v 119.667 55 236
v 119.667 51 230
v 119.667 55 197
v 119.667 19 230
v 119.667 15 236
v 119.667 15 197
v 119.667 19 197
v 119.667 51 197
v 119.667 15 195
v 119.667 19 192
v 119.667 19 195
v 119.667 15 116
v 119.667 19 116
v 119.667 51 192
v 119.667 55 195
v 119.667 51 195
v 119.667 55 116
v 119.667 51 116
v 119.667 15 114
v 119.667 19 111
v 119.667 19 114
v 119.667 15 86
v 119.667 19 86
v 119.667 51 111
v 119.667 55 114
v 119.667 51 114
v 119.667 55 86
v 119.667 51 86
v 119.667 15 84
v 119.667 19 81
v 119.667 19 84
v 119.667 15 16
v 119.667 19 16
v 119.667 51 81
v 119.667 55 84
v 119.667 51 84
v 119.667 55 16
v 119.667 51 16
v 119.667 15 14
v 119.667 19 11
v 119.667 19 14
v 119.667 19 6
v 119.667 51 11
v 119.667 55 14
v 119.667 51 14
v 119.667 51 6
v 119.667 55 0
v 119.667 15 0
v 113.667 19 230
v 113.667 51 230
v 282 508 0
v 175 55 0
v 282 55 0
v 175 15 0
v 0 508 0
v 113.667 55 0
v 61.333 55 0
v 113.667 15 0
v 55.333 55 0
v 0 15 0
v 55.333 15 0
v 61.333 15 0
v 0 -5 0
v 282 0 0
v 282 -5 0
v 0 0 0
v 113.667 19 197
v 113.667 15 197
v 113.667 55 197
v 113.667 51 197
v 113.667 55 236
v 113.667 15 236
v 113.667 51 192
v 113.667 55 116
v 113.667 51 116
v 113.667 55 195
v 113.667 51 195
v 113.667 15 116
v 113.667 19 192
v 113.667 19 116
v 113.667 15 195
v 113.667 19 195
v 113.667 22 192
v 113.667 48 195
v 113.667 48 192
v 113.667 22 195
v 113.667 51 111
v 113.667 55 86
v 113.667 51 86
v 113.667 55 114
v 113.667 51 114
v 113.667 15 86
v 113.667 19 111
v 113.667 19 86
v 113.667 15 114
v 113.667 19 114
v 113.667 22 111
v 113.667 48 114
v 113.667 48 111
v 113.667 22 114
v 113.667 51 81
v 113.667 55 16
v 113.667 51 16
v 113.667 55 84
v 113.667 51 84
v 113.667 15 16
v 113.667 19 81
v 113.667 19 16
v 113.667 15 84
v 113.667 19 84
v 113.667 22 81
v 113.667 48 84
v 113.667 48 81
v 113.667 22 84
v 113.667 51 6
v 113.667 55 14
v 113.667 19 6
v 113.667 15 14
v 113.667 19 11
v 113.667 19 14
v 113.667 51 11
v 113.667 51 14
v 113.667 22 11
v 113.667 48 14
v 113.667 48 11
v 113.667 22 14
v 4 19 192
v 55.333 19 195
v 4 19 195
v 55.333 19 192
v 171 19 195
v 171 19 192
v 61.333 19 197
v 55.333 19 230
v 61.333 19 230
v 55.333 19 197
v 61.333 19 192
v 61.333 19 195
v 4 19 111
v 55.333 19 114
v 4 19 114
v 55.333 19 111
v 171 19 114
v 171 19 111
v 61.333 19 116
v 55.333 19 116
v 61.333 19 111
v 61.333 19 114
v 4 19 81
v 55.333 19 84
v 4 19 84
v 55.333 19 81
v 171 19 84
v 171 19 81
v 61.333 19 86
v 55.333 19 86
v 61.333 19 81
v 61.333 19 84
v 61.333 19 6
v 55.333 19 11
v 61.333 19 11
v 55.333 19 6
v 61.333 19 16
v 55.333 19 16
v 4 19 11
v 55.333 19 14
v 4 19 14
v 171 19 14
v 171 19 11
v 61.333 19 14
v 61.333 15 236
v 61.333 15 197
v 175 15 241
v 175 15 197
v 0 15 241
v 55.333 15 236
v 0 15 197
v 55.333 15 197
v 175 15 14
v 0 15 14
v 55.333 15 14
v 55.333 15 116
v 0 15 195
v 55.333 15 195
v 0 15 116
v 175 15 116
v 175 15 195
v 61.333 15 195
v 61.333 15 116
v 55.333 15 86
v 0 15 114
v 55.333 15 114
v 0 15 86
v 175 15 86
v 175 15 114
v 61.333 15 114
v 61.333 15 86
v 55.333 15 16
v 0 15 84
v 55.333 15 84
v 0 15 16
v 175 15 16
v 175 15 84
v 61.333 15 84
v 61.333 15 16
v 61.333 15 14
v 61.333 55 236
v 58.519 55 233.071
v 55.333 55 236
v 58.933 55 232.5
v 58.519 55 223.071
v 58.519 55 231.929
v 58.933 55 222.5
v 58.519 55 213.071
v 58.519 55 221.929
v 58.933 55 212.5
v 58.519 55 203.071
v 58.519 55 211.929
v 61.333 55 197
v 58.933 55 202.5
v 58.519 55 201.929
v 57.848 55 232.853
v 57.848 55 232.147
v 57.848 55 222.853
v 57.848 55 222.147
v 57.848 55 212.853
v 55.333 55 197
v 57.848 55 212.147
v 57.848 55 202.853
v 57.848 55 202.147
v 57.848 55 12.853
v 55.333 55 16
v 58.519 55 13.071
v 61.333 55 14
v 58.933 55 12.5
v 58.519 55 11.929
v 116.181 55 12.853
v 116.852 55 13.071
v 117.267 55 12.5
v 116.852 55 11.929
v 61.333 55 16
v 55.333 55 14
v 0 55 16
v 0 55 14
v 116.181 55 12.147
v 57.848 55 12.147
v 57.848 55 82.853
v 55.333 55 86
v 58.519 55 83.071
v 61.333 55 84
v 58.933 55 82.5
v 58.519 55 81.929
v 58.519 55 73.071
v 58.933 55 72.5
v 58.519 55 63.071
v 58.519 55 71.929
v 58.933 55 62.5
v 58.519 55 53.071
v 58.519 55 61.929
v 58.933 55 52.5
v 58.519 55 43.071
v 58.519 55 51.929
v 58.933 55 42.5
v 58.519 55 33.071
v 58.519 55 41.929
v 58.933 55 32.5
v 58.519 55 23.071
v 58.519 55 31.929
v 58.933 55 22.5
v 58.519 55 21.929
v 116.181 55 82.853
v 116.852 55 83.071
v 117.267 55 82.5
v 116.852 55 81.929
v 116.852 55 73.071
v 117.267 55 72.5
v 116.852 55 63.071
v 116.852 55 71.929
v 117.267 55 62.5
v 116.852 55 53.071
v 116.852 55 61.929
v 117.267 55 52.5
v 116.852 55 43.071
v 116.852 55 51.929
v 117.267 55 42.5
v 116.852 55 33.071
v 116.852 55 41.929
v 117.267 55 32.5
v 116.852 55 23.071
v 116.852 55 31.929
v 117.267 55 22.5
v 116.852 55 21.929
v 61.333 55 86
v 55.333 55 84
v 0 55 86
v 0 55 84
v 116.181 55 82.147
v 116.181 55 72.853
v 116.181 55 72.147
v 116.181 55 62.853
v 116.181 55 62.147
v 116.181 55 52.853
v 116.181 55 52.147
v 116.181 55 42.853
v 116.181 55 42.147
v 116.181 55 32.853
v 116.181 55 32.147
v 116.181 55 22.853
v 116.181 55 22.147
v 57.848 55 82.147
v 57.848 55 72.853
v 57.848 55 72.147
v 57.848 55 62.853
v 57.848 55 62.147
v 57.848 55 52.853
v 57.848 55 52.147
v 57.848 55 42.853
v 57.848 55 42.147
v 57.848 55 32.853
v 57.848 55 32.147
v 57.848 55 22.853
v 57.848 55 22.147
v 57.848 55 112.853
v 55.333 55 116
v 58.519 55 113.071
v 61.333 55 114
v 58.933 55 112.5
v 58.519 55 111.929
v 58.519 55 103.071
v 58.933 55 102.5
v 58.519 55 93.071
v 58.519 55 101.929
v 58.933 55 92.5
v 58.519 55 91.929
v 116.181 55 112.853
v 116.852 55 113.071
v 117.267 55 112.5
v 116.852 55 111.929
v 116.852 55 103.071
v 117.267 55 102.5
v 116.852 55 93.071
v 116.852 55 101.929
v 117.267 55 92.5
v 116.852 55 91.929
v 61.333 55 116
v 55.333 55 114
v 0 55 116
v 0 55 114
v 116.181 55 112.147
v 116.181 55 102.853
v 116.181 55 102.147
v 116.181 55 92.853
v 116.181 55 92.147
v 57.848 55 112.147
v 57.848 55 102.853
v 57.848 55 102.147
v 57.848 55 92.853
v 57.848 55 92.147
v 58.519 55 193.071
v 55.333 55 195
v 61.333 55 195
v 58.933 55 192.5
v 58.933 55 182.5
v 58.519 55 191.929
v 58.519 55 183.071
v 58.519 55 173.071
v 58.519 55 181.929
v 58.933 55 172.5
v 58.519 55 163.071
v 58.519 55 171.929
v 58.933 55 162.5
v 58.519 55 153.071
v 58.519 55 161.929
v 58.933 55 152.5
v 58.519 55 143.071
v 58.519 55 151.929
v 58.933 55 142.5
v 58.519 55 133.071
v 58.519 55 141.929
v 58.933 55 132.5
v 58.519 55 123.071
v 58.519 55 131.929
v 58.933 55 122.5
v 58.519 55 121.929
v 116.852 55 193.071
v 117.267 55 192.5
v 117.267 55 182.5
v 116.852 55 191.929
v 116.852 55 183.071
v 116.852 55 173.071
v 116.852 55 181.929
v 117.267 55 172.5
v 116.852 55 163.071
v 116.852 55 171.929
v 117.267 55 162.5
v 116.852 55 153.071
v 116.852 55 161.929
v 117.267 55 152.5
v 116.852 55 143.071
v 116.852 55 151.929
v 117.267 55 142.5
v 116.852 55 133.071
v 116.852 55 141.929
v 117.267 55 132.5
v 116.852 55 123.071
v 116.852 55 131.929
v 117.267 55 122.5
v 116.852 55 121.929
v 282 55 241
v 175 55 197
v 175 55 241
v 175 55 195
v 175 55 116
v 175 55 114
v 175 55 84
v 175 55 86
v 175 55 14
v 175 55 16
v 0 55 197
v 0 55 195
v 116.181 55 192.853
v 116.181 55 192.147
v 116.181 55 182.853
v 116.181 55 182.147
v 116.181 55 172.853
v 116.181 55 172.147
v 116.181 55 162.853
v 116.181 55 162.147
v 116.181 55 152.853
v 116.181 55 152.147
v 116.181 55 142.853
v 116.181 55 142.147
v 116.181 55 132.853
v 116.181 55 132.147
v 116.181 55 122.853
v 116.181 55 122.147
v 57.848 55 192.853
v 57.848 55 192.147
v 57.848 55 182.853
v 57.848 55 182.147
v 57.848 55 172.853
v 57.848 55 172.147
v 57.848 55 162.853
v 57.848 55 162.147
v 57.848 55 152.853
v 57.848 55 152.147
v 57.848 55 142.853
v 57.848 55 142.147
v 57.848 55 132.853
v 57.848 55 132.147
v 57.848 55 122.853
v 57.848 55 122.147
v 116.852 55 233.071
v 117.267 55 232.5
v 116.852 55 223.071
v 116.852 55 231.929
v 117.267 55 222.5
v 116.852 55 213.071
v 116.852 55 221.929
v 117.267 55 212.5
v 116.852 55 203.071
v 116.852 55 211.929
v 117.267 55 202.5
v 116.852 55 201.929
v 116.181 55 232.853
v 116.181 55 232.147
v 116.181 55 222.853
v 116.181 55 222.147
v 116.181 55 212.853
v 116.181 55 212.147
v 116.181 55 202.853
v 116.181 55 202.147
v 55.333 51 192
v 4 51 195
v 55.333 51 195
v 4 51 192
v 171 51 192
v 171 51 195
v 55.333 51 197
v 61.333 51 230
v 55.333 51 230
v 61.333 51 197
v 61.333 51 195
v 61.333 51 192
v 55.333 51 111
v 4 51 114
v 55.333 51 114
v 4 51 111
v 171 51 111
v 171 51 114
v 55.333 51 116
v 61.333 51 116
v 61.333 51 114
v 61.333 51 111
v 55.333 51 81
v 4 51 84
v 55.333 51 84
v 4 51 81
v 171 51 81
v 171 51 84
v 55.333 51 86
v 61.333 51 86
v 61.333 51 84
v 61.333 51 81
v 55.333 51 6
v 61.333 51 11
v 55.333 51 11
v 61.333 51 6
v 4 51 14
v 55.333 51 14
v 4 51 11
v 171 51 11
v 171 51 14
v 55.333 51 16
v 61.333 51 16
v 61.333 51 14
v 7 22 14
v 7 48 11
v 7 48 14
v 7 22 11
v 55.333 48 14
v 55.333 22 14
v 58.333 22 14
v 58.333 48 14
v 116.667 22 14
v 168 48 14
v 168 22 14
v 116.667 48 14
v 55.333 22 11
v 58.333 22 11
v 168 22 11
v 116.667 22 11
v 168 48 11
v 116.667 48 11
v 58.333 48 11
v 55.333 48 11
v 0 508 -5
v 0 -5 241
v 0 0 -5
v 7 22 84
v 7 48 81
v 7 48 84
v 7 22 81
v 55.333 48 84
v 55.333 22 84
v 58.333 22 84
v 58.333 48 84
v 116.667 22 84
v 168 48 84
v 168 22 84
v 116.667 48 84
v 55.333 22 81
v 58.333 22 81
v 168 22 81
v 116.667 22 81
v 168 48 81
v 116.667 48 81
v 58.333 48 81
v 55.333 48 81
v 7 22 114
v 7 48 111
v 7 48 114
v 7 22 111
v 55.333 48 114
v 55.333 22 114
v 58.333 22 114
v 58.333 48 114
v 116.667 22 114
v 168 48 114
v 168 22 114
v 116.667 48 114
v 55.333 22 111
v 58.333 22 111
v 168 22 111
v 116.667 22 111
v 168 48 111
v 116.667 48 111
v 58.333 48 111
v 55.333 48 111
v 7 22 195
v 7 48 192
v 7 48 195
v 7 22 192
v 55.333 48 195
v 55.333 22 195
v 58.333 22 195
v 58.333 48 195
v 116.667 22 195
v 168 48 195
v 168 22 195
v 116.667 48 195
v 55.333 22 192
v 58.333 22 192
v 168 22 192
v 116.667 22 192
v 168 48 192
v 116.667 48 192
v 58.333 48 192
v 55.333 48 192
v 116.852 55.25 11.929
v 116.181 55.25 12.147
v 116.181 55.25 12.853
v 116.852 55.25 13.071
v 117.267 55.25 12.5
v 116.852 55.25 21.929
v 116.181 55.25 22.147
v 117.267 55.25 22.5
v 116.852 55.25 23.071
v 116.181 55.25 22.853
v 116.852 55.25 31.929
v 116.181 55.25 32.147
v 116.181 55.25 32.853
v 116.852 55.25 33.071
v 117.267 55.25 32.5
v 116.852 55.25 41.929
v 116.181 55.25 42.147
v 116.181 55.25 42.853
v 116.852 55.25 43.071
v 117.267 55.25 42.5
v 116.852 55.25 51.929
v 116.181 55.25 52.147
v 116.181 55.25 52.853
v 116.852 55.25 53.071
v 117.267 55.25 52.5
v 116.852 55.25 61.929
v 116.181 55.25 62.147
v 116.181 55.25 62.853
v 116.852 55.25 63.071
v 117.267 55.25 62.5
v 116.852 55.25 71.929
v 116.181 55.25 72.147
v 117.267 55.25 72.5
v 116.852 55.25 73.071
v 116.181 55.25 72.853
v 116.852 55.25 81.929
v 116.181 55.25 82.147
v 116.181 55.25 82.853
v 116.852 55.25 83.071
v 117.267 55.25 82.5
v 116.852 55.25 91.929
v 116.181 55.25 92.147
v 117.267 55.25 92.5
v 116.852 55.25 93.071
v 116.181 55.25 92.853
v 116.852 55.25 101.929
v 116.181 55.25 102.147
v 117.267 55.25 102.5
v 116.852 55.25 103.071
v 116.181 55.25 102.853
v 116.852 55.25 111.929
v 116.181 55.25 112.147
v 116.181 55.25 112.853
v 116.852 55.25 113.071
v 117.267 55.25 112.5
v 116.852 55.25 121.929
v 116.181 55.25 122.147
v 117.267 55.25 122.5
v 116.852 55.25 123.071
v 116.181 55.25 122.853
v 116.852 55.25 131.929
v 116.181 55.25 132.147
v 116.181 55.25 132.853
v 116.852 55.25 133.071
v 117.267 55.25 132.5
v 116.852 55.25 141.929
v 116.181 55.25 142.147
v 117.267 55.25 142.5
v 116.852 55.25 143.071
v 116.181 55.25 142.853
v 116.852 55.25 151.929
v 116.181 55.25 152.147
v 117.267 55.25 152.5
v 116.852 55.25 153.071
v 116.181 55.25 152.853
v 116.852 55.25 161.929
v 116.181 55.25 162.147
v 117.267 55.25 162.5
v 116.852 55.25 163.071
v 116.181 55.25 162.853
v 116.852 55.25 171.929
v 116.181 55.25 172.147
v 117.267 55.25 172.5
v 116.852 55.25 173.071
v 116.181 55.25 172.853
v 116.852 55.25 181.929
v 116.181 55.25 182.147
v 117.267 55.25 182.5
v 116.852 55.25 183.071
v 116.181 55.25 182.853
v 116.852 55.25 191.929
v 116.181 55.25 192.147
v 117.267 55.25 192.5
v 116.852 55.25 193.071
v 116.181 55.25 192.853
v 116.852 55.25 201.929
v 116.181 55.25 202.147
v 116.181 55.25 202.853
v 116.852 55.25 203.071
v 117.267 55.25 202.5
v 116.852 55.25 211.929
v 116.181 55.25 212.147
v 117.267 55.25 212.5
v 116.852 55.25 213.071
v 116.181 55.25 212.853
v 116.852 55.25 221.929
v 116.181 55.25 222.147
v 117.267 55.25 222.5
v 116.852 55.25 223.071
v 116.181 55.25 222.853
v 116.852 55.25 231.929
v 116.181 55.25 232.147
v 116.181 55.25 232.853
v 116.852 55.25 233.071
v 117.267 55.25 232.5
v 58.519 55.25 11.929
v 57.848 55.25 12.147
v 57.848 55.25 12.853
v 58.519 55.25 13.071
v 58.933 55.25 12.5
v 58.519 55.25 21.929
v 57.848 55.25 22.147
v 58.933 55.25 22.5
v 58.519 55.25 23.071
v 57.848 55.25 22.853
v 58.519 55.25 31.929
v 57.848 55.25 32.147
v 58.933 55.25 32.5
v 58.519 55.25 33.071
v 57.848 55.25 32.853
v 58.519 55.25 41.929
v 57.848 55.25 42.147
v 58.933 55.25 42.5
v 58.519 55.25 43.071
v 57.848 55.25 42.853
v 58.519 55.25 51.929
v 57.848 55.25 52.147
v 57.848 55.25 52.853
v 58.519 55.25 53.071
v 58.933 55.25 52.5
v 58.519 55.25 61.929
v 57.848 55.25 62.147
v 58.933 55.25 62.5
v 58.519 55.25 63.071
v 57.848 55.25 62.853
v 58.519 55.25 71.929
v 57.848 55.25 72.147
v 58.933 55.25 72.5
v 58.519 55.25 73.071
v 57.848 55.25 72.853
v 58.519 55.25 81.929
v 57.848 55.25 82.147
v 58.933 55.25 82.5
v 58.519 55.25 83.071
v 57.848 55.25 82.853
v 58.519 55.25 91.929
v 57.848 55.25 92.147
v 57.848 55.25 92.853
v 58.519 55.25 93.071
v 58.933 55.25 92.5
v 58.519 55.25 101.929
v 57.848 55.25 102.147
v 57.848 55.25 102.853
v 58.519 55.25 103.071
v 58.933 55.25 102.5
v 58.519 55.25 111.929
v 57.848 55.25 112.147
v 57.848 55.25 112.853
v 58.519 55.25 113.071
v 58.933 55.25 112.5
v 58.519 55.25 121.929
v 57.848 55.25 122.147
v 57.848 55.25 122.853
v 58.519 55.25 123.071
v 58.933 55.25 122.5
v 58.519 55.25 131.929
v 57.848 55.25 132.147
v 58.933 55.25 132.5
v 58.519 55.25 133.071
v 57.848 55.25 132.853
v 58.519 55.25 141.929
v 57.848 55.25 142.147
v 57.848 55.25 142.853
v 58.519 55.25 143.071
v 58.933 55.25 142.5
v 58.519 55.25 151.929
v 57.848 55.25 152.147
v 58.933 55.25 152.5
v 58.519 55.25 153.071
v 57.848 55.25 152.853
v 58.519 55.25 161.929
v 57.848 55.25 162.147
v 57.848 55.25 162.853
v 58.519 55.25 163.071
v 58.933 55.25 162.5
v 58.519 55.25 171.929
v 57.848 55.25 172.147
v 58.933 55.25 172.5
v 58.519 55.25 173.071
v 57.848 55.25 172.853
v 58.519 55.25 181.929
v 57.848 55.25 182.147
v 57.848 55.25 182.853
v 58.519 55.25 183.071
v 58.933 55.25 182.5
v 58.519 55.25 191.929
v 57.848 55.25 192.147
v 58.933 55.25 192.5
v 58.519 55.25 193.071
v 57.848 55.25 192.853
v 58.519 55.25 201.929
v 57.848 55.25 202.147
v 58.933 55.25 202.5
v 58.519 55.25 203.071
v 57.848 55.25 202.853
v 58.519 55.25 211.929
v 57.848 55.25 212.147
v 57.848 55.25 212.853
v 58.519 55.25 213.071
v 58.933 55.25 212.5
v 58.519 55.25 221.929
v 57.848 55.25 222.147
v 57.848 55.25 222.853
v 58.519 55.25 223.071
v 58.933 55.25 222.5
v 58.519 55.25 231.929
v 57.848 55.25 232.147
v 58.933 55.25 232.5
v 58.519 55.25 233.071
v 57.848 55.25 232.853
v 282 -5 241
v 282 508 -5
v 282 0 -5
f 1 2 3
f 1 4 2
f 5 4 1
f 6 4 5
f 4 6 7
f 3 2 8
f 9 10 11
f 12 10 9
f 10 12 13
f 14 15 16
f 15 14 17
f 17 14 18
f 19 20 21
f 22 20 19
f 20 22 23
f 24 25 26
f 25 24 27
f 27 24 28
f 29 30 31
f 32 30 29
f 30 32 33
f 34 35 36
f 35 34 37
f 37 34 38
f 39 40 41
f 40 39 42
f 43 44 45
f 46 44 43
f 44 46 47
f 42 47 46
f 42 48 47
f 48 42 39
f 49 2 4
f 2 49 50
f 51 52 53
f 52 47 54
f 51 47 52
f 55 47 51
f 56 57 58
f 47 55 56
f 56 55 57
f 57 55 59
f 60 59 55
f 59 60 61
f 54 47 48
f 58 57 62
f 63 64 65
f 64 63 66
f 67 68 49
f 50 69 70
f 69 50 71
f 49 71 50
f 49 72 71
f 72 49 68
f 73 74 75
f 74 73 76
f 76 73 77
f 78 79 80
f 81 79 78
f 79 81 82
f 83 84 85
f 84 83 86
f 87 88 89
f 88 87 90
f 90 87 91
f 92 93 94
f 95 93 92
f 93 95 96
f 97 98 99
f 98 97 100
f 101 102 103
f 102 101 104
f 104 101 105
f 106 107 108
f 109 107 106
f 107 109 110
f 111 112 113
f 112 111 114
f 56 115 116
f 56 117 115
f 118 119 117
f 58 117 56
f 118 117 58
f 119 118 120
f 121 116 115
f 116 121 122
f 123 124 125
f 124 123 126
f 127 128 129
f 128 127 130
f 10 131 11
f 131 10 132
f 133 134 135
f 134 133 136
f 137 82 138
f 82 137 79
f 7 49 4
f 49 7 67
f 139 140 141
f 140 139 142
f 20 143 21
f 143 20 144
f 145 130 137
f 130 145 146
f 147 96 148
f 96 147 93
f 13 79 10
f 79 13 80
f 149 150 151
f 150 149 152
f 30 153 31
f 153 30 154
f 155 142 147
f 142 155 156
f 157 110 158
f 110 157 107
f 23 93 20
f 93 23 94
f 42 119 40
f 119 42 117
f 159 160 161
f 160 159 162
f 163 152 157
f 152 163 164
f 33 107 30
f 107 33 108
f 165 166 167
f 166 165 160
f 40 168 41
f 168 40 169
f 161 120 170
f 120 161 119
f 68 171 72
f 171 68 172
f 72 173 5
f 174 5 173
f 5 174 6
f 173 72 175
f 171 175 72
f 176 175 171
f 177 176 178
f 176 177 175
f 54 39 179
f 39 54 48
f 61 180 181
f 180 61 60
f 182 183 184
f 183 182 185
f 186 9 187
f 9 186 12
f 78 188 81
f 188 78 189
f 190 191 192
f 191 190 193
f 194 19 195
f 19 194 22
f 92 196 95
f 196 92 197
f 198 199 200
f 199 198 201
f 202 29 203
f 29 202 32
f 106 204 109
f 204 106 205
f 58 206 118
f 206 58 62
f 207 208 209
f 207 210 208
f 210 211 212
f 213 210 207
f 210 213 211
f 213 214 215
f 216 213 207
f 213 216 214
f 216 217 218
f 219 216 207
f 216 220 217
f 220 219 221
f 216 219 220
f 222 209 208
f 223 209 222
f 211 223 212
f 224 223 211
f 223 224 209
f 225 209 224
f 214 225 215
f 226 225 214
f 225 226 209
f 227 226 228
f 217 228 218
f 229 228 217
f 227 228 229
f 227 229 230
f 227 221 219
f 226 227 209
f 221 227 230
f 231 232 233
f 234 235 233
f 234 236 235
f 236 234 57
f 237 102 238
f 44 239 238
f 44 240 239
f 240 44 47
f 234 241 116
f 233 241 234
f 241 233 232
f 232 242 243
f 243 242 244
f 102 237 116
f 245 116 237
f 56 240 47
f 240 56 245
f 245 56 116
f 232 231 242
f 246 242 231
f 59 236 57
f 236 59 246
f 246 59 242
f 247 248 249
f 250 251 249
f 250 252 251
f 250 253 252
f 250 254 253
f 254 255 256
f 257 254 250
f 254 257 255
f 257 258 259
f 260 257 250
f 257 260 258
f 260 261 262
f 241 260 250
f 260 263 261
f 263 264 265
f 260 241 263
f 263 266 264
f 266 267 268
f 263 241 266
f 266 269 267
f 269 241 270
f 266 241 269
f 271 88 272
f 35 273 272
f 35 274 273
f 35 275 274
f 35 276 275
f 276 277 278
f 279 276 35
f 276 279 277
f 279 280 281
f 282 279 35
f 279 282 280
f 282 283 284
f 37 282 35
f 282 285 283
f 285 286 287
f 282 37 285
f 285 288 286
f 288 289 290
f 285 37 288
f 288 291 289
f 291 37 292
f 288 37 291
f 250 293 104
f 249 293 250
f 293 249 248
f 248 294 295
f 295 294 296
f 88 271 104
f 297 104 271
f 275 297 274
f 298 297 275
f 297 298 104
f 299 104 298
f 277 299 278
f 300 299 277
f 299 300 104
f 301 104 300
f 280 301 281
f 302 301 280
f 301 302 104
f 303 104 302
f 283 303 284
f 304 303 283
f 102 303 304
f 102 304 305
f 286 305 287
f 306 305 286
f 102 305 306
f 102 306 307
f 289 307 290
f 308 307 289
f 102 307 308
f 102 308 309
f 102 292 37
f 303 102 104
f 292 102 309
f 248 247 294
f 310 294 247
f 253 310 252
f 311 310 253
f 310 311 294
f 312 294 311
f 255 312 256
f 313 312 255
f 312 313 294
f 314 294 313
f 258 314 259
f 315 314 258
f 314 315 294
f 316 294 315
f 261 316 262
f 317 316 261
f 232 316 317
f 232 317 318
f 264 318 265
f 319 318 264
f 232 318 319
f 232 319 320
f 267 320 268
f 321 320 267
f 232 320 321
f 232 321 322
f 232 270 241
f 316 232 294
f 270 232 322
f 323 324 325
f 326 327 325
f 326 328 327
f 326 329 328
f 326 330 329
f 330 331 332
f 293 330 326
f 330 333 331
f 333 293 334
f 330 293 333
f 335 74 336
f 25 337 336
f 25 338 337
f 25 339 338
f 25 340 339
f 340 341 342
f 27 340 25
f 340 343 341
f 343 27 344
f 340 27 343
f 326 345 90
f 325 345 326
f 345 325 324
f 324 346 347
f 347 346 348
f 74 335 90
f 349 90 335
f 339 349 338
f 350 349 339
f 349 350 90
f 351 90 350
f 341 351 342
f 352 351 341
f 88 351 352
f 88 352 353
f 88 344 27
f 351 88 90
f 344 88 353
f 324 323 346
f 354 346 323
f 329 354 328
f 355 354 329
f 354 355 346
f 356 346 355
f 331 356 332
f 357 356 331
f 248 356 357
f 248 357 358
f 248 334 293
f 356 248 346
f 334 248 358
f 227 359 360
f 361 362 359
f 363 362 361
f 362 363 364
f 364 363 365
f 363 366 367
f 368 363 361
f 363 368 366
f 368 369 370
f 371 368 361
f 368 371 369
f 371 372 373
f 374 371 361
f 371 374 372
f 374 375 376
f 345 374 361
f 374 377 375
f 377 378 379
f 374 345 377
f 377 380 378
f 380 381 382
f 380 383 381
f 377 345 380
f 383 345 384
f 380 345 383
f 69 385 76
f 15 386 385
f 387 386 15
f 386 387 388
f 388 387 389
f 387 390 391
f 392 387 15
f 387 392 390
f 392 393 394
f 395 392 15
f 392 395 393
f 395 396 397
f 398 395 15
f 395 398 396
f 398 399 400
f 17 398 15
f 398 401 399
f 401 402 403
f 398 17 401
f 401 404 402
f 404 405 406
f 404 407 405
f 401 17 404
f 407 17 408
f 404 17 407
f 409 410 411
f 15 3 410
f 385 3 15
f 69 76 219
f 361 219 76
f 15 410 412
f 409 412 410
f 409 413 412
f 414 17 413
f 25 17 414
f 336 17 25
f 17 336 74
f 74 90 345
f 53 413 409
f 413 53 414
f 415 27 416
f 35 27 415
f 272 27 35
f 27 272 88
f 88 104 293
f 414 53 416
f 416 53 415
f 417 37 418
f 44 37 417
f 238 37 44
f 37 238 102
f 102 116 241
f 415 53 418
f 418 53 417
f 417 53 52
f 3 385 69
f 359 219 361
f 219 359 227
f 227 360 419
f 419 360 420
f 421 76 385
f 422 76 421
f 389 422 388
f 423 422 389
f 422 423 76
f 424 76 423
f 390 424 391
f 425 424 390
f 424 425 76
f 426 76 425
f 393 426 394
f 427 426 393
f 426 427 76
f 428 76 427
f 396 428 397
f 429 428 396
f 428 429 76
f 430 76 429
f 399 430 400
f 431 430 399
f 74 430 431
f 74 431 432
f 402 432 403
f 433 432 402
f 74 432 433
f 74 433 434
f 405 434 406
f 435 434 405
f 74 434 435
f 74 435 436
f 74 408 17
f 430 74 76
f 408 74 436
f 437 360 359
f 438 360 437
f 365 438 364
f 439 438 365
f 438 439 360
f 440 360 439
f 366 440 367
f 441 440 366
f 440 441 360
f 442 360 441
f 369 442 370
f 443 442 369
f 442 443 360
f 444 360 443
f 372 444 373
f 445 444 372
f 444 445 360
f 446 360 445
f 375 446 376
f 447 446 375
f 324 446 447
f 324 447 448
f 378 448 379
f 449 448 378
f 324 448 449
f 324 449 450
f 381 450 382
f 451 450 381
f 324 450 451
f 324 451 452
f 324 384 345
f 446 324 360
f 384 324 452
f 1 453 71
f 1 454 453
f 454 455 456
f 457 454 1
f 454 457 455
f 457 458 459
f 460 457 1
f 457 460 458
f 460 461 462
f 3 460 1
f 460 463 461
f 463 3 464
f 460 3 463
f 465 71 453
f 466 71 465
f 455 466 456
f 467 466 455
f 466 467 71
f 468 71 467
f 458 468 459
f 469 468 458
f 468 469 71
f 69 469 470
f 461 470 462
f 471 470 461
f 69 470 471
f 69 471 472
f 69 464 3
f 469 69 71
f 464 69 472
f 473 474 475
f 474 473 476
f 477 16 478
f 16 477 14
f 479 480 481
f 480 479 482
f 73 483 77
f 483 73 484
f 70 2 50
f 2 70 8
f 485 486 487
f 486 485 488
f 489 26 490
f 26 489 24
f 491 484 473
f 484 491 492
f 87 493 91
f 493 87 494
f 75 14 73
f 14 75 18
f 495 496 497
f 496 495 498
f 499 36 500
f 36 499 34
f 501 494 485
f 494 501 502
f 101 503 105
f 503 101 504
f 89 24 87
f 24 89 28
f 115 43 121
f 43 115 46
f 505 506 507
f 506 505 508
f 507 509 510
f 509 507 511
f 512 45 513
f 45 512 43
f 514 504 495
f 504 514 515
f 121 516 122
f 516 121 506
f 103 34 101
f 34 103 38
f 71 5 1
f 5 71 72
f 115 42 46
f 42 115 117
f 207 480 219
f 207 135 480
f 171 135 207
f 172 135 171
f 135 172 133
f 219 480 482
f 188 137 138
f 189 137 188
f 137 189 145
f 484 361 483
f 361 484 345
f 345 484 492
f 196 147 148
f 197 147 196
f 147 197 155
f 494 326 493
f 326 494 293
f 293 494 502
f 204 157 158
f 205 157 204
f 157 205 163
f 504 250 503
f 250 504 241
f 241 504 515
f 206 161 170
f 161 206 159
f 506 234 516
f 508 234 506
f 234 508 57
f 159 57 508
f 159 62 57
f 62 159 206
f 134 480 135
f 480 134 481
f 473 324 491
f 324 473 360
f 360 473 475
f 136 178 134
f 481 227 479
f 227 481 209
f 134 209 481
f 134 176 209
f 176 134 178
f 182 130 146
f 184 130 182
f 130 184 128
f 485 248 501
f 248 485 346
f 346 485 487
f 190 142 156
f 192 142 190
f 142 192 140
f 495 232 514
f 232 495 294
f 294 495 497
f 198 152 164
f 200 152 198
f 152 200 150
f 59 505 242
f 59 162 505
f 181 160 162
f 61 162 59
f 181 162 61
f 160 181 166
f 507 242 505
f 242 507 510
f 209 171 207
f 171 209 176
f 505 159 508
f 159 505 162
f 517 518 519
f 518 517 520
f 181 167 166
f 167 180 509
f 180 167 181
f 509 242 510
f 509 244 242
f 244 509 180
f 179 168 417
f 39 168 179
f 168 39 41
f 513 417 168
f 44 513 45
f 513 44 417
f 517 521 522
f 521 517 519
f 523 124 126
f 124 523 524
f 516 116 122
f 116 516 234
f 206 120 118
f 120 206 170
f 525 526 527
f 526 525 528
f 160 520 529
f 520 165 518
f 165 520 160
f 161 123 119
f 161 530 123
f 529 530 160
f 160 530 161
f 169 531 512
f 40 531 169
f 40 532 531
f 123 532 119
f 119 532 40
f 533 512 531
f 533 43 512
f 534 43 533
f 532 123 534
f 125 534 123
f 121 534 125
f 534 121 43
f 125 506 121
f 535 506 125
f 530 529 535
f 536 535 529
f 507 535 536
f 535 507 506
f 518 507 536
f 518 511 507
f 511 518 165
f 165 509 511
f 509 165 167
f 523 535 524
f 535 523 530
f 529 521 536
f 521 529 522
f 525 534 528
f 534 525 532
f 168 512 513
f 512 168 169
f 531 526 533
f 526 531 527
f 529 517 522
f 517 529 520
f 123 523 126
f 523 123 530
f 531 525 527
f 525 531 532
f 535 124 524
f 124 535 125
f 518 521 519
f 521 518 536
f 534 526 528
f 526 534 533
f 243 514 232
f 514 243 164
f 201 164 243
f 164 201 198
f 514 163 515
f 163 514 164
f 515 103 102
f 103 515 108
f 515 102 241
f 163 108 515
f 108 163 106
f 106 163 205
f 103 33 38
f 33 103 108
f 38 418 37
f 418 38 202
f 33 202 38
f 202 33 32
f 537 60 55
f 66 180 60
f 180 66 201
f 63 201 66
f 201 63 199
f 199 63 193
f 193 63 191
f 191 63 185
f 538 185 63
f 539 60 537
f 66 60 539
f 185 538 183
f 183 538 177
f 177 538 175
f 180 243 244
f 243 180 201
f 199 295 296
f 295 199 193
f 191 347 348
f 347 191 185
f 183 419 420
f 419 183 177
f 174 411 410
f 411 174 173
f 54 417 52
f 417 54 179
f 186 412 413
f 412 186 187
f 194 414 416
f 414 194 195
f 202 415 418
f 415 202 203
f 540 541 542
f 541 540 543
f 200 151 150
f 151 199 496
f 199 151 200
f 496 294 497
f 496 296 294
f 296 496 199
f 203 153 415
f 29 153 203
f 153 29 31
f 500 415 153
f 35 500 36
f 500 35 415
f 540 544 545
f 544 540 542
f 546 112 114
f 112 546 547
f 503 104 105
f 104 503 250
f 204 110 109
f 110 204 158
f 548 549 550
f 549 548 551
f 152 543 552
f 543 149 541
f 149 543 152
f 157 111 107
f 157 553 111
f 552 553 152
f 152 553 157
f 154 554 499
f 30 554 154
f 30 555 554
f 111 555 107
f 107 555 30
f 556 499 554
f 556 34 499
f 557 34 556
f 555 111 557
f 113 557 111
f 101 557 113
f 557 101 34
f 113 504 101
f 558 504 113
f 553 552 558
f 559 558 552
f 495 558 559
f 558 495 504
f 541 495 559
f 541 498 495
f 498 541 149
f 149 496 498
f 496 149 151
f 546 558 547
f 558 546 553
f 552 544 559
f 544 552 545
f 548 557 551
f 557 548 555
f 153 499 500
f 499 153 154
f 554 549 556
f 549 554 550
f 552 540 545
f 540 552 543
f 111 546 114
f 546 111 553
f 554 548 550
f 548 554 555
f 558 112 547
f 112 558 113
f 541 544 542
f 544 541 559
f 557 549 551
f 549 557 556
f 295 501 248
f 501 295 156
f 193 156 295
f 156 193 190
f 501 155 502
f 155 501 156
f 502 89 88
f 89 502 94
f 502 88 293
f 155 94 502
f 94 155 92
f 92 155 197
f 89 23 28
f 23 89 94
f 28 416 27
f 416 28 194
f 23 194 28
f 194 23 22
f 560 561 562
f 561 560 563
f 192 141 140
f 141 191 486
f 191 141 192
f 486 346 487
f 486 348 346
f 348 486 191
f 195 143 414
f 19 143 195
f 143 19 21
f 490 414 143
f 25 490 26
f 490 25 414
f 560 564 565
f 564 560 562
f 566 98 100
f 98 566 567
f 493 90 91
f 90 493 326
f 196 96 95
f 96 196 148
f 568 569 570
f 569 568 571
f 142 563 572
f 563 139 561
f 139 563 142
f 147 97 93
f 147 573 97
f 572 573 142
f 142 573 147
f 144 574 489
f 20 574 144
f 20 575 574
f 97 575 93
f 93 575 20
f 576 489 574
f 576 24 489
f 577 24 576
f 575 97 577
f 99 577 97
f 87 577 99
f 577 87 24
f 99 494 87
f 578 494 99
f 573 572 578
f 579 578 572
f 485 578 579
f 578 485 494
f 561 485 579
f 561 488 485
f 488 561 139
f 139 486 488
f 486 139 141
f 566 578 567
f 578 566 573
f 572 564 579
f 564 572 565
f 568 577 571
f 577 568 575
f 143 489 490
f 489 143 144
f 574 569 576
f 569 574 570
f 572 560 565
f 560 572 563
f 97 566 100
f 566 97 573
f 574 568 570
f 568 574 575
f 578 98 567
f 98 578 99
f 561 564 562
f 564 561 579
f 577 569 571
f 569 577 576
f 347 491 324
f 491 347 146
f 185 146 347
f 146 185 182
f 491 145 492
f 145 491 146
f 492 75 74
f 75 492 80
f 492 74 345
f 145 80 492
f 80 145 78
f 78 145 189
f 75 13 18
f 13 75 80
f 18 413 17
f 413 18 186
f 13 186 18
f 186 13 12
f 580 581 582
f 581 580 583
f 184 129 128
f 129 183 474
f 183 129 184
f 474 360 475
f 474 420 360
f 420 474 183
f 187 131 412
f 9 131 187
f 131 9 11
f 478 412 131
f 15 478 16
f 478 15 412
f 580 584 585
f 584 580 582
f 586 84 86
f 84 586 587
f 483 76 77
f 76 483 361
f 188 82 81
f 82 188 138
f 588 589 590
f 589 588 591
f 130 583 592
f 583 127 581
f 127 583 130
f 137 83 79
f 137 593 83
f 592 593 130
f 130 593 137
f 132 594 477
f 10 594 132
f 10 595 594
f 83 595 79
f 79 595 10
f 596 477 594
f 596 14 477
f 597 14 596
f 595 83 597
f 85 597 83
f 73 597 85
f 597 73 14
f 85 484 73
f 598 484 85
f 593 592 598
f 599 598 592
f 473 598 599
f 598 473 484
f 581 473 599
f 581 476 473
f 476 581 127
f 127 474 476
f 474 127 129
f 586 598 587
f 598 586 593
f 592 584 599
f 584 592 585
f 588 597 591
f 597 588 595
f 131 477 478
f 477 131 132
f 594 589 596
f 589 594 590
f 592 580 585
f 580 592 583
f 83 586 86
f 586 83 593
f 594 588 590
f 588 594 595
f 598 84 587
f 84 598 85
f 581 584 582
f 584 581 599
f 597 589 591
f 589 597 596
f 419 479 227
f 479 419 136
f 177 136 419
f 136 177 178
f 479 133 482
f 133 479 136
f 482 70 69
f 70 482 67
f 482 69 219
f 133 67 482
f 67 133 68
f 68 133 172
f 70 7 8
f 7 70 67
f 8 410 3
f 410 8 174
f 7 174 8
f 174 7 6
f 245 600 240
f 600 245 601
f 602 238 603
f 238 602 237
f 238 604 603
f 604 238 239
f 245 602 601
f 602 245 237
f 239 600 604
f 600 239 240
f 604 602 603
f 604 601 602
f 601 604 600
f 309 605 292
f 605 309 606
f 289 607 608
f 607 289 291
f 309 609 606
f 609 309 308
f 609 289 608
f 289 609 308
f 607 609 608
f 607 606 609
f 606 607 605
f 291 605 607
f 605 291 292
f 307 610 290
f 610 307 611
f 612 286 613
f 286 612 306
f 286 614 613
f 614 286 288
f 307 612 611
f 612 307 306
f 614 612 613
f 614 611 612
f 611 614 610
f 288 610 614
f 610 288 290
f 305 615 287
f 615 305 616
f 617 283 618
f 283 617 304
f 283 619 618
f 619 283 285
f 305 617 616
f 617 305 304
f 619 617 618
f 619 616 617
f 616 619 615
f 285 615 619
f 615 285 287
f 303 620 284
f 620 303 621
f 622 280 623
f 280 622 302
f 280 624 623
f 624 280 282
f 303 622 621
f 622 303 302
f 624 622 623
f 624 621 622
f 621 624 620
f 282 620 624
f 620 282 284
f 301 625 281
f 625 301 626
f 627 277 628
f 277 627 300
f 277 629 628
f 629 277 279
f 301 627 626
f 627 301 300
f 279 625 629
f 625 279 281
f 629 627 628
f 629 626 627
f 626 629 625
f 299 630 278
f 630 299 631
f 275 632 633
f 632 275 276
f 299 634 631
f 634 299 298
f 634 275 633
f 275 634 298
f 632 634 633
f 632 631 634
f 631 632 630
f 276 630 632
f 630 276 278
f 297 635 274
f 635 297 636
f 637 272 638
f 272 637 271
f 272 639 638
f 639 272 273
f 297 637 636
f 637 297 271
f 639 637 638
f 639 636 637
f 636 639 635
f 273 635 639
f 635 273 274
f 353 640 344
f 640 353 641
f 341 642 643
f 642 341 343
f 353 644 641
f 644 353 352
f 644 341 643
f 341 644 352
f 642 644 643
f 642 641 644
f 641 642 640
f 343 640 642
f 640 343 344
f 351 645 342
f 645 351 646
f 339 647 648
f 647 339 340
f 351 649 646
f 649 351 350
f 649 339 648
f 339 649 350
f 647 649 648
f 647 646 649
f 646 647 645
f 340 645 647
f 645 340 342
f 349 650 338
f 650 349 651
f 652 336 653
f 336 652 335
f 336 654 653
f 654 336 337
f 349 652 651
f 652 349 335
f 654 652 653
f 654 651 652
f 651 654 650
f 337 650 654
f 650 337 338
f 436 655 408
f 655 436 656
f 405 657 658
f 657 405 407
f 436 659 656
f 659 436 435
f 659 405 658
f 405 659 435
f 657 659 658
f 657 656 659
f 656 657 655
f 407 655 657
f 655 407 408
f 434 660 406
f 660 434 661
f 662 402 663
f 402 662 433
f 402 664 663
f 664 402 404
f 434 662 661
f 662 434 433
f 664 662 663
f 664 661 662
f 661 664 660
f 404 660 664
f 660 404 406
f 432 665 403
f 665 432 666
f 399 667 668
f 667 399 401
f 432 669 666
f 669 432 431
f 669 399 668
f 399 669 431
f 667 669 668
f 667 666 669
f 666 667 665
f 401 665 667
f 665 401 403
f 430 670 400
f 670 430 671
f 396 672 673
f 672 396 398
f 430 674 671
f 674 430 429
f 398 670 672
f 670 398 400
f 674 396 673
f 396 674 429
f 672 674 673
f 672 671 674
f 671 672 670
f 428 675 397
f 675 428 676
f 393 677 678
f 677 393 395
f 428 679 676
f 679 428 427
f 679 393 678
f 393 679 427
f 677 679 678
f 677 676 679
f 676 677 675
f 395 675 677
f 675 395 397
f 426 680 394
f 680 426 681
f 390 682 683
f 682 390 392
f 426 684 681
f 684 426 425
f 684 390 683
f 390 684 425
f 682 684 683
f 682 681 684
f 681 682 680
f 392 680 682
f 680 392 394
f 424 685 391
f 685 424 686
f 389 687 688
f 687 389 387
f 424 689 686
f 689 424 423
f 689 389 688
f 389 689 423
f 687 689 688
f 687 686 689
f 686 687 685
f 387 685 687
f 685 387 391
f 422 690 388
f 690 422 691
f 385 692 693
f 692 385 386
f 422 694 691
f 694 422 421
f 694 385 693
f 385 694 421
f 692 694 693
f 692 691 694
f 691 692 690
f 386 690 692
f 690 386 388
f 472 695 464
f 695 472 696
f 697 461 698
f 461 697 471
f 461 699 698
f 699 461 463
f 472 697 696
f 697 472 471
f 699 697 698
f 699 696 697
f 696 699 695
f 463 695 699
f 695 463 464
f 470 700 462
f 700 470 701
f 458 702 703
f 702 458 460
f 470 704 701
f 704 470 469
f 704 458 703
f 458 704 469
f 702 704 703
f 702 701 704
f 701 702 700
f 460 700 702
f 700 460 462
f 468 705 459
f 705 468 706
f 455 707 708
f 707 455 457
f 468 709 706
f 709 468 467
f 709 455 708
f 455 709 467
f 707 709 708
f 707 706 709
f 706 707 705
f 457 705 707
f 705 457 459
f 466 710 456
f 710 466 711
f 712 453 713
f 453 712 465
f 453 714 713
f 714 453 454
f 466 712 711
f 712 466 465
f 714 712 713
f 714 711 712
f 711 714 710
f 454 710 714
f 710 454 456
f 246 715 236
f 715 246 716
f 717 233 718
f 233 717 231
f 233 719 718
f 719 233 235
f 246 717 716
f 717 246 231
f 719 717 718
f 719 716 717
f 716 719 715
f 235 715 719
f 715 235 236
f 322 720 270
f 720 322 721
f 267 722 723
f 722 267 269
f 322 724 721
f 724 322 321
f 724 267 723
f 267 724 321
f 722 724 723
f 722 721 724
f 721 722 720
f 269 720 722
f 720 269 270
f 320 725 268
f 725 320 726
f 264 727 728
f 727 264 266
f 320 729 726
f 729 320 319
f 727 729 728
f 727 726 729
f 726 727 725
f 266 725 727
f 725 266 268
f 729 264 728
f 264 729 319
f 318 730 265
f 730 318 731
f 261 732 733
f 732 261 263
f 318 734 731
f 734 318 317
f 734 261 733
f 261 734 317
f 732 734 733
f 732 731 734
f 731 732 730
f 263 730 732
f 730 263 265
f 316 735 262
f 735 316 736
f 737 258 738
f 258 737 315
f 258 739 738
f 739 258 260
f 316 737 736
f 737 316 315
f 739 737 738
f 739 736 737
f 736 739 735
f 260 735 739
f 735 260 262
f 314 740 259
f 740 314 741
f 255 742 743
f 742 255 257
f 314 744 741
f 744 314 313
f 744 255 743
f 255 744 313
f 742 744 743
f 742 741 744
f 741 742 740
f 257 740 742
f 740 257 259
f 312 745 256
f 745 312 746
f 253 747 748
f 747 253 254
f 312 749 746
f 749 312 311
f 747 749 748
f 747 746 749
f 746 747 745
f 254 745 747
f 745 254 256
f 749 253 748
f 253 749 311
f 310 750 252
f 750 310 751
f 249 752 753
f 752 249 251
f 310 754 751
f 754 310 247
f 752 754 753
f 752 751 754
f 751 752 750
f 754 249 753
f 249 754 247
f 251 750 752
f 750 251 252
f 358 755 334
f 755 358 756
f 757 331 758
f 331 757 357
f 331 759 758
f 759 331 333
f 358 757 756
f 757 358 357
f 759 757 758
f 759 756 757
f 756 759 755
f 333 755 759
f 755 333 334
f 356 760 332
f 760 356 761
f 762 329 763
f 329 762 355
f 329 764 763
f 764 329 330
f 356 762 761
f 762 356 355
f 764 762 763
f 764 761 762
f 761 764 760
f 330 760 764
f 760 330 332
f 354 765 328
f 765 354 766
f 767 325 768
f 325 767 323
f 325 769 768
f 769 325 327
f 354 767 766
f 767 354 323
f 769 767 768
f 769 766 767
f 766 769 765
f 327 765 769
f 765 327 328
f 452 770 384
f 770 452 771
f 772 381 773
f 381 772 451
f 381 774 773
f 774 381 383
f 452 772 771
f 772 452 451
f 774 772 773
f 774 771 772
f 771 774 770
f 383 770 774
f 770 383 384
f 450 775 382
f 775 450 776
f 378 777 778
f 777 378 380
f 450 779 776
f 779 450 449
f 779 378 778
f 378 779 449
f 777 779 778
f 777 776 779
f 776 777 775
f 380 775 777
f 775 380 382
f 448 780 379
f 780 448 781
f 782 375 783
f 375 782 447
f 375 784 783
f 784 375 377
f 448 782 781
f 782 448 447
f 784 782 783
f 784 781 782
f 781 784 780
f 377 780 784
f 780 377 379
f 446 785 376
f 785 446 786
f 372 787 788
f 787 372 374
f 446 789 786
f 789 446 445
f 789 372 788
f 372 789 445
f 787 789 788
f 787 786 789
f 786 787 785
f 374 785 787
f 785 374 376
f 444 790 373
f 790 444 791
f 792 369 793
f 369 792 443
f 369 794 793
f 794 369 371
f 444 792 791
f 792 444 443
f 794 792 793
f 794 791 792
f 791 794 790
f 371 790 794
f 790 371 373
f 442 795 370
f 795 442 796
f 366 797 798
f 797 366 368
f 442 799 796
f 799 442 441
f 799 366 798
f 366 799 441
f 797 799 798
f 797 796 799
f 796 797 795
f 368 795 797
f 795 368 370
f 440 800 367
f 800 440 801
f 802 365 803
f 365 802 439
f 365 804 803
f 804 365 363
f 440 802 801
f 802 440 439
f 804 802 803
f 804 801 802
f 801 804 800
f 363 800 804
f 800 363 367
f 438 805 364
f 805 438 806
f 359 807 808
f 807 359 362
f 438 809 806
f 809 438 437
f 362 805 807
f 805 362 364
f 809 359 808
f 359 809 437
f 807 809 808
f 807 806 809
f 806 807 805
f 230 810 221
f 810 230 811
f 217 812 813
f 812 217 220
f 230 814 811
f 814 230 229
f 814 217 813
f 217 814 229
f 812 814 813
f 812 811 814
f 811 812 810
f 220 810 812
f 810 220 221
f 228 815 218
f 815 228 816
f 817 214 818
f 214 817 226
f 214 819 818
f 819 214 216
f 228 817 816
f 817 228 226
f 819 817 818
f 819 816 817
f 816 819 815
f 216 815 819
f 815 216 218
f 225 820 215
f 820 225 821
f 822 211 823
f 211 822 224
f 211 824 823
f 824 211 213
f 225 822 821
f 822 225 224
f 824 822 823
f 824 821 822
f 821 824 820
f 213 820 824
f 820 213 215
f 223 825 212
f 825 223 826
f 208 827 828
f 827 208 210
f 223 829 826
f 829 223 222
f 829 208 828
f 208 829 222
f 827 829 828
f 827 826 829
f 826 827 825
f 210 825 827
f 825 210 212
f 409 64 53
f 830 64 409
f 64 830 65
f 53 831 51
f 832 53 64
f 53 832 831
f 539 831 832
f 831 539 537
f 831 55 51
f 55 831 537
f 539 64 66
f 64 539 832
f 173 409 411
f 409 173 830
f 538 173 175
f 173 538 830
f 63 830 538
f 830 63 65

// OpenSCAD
// all in cm
spacer = 5;

toilet_wall_width = 107;
green_box_width = 175;
green_box_thickness = spacer * 4;
max_depth = 40;

room_width = toilet_wall_width + green_box_width;
room_length = 508;
room_height = 241;

metal_bars_width = 6;
metal_bars_depth = 4;
wood_thickness = 2;
metal_thickness = 3;

stone_floor();
toilet_wall();
green_box();
furniture();

// x, y, z
module stone_floor() {
  translate([0, 0, -spacer])
    color("GhostWhite") cube([room_width, room_length, spacer]);
}

module green_box() {
  translate([0, -spacer, 0])
    color("Silver") cube([green_box_width, green_box_thickness, room_height]);
}

module toilet_wall() {
  translate([green_box_width, -spacer, 0])
    color("Silver") cube([toilet_wall_width, max_depth + green_box_thickness, room_height]);
}

module furniture() {
  floor_furniture_spacing = 11;
  furniture_width = green_box_width;
  furniture_right = furniture_width / 3 * 1;
  furniture_left = furniture_width / 3 * 2;
  furniture_height = room_height - floor_furniture_spacing;

  pilar1 = furniture_left - (metal_bars_width / 2);
  pilar2 = furniture_right - (metal_bars_width / 2);

  vertical_frame(pilar1, furniture_height);
  vertical_frame(pilar2, furniture_height);

  furniture_start = floor_furniture_spacing;
  row1 = 65 + metal_thickness + wood_thickness;
  row2 = 25 + metal_thickness + wood_thickness;
  row3 = 76 + metal_thickness + wood_thickness;

  shelf(
    furniture_width,
    furniture_start,
    pilar1, pilar2);

  shelf(
    furniture_width,
    furniture_start + row1,
    pilar1, pilar2);

  shelf(
    furniture_width,
    furniture_start + row1 + row2,
    pilar1, pilar2);

  shelf(
    furniture_width,
    furniture_start + row1 + row2 + row3,
    pilar1, pilar2);

  bolts(furniture_start, pilar1, pilar2);
}

module vertical_frame(start, height) {
    // max_depth
  translate([start, green_box_thickness - spacer, 0])
    color("Black") cube([metal_bars_width, metal_bars_depth, height]);

  translate([start, green_box_thickness - spacer + max_depth - metal_bars_depth, 0])
    color("Black") cube([metal_bars_width, metal_bars_depth, height]);

  translate([start, green_box_thickness - spacer, height])
    color("Black") cube([metal_bars_width, max_depth, metal_bars_width]);

  translate([start, green_box_thickness - spacer, 0])
    color("Black") cube([metal_bars_width, max_depth, metal_bars_width]);
}

module shelf(width, height, pilar1, pilar2) {
  height = height + metal_thickness;

  // translate([0, green_box_thickness - spacer, height - metal_thickness])
  //   color("Black") cube([width, max_depth, metal_thickness]);

  translate([metal_bars_depth, green_box_thickness - spacer + metal_bars_depth, height - metal_thickness])
    color("Black") cube([metal_thickness, max_depth - metal_bars_depth - metal_bars_depth, metal_thickness]);

  translate([pilar2, green_box_thickness - spacer + metal_bars_depth, height - metal_thickness])
    color("Black") cube([metal_thickness, max_depth - metal_bars_depth - metal_bars_depth, metal_thickness]);

  translate([pilar1, green_box_thickness - spacer + metal_bars_depth, height - metal_thickness])
    color("Black") cube([metal_thickness, max_depth - metal_bars_depth - metal_bars_depth, metal_thickness]);

  translate([width - metal_thickness - metal_bars_depth, green_box_thickness - spacer + metal_bars_depth, height - metal_thickness])
    color("Black") cube([metal_thickness, max_depth - metal_bars_depth - metal_bars_depth, metal_thickness]);


  translate([metal_bars_depth, green_box_thickness - spacer + metal_bars_depth, height - metal_thickness])
    color("Black") cube([width - metal_bars_depth - metal_bars_depth, metal_thickness, metal_thickness]);
  translate([metal_bars_depth, green_box_thickness - spacer + max_depth - metal_bars_depth - metal_thickness, height - metal_thickness])
    color("Black") cube([width - metal_bars_depth - metal_bars_depth, metal_thickness, metal_thickness]);


  translate([0, green_box_thickness - spacer, height])
    color("OrangeRed") cube([pilar2, max_depth, wood_thickness]);

  translate([pilar2, green_box_thickness - spacer + metal_bars_depth, height])
    color("OrangeRed") cube([metal_bars_width, max_depth - (metal_bars_depth * 2), wood_thickness]);

  translate([pilar2 + metal_bars_width, green_box_thickness - spacer, height])
    color("OrangeRed") cube([pilar1 - pilar2 - metal_bars_width, max_depth, wood_thickness]);

  translate([pilar1, green_box_thickness - spacer + metal_bars_depth, height])
    color("OrangeRed") cube([metal_bars_width, max_depth - (metal_bars_depth * 2), wood_thickness]);

  translate([pilar1 + metal_bars_width, green_box_thickness - spacer, height])
    color("OrangeRed") cube([width - pilar1 - metal_bars_width, max_depth, wood_thickness]);
}

module bolts(start, pilar1, pilar2) {
  bolt_row(pilar1 + (metal_bars_width / 2), start);
  bolt_row(pilar2 + (metal_bars_width / 2), start);
}

module bolt_row(left, start) {
  bar = (metal_thickness / 2);
  height = 10;

  for (i=[0:22]) {
    bolt(left, start + (i * height) + bar);
  }
}

module bolt(left, bottom) {
  translate([left, max_depth + green_box_thickness - spacer, bottom])
  rotate([90, 0, 0]) color("SlateGray") cylinder(h=0.5, r=0.6, center=true);
}
